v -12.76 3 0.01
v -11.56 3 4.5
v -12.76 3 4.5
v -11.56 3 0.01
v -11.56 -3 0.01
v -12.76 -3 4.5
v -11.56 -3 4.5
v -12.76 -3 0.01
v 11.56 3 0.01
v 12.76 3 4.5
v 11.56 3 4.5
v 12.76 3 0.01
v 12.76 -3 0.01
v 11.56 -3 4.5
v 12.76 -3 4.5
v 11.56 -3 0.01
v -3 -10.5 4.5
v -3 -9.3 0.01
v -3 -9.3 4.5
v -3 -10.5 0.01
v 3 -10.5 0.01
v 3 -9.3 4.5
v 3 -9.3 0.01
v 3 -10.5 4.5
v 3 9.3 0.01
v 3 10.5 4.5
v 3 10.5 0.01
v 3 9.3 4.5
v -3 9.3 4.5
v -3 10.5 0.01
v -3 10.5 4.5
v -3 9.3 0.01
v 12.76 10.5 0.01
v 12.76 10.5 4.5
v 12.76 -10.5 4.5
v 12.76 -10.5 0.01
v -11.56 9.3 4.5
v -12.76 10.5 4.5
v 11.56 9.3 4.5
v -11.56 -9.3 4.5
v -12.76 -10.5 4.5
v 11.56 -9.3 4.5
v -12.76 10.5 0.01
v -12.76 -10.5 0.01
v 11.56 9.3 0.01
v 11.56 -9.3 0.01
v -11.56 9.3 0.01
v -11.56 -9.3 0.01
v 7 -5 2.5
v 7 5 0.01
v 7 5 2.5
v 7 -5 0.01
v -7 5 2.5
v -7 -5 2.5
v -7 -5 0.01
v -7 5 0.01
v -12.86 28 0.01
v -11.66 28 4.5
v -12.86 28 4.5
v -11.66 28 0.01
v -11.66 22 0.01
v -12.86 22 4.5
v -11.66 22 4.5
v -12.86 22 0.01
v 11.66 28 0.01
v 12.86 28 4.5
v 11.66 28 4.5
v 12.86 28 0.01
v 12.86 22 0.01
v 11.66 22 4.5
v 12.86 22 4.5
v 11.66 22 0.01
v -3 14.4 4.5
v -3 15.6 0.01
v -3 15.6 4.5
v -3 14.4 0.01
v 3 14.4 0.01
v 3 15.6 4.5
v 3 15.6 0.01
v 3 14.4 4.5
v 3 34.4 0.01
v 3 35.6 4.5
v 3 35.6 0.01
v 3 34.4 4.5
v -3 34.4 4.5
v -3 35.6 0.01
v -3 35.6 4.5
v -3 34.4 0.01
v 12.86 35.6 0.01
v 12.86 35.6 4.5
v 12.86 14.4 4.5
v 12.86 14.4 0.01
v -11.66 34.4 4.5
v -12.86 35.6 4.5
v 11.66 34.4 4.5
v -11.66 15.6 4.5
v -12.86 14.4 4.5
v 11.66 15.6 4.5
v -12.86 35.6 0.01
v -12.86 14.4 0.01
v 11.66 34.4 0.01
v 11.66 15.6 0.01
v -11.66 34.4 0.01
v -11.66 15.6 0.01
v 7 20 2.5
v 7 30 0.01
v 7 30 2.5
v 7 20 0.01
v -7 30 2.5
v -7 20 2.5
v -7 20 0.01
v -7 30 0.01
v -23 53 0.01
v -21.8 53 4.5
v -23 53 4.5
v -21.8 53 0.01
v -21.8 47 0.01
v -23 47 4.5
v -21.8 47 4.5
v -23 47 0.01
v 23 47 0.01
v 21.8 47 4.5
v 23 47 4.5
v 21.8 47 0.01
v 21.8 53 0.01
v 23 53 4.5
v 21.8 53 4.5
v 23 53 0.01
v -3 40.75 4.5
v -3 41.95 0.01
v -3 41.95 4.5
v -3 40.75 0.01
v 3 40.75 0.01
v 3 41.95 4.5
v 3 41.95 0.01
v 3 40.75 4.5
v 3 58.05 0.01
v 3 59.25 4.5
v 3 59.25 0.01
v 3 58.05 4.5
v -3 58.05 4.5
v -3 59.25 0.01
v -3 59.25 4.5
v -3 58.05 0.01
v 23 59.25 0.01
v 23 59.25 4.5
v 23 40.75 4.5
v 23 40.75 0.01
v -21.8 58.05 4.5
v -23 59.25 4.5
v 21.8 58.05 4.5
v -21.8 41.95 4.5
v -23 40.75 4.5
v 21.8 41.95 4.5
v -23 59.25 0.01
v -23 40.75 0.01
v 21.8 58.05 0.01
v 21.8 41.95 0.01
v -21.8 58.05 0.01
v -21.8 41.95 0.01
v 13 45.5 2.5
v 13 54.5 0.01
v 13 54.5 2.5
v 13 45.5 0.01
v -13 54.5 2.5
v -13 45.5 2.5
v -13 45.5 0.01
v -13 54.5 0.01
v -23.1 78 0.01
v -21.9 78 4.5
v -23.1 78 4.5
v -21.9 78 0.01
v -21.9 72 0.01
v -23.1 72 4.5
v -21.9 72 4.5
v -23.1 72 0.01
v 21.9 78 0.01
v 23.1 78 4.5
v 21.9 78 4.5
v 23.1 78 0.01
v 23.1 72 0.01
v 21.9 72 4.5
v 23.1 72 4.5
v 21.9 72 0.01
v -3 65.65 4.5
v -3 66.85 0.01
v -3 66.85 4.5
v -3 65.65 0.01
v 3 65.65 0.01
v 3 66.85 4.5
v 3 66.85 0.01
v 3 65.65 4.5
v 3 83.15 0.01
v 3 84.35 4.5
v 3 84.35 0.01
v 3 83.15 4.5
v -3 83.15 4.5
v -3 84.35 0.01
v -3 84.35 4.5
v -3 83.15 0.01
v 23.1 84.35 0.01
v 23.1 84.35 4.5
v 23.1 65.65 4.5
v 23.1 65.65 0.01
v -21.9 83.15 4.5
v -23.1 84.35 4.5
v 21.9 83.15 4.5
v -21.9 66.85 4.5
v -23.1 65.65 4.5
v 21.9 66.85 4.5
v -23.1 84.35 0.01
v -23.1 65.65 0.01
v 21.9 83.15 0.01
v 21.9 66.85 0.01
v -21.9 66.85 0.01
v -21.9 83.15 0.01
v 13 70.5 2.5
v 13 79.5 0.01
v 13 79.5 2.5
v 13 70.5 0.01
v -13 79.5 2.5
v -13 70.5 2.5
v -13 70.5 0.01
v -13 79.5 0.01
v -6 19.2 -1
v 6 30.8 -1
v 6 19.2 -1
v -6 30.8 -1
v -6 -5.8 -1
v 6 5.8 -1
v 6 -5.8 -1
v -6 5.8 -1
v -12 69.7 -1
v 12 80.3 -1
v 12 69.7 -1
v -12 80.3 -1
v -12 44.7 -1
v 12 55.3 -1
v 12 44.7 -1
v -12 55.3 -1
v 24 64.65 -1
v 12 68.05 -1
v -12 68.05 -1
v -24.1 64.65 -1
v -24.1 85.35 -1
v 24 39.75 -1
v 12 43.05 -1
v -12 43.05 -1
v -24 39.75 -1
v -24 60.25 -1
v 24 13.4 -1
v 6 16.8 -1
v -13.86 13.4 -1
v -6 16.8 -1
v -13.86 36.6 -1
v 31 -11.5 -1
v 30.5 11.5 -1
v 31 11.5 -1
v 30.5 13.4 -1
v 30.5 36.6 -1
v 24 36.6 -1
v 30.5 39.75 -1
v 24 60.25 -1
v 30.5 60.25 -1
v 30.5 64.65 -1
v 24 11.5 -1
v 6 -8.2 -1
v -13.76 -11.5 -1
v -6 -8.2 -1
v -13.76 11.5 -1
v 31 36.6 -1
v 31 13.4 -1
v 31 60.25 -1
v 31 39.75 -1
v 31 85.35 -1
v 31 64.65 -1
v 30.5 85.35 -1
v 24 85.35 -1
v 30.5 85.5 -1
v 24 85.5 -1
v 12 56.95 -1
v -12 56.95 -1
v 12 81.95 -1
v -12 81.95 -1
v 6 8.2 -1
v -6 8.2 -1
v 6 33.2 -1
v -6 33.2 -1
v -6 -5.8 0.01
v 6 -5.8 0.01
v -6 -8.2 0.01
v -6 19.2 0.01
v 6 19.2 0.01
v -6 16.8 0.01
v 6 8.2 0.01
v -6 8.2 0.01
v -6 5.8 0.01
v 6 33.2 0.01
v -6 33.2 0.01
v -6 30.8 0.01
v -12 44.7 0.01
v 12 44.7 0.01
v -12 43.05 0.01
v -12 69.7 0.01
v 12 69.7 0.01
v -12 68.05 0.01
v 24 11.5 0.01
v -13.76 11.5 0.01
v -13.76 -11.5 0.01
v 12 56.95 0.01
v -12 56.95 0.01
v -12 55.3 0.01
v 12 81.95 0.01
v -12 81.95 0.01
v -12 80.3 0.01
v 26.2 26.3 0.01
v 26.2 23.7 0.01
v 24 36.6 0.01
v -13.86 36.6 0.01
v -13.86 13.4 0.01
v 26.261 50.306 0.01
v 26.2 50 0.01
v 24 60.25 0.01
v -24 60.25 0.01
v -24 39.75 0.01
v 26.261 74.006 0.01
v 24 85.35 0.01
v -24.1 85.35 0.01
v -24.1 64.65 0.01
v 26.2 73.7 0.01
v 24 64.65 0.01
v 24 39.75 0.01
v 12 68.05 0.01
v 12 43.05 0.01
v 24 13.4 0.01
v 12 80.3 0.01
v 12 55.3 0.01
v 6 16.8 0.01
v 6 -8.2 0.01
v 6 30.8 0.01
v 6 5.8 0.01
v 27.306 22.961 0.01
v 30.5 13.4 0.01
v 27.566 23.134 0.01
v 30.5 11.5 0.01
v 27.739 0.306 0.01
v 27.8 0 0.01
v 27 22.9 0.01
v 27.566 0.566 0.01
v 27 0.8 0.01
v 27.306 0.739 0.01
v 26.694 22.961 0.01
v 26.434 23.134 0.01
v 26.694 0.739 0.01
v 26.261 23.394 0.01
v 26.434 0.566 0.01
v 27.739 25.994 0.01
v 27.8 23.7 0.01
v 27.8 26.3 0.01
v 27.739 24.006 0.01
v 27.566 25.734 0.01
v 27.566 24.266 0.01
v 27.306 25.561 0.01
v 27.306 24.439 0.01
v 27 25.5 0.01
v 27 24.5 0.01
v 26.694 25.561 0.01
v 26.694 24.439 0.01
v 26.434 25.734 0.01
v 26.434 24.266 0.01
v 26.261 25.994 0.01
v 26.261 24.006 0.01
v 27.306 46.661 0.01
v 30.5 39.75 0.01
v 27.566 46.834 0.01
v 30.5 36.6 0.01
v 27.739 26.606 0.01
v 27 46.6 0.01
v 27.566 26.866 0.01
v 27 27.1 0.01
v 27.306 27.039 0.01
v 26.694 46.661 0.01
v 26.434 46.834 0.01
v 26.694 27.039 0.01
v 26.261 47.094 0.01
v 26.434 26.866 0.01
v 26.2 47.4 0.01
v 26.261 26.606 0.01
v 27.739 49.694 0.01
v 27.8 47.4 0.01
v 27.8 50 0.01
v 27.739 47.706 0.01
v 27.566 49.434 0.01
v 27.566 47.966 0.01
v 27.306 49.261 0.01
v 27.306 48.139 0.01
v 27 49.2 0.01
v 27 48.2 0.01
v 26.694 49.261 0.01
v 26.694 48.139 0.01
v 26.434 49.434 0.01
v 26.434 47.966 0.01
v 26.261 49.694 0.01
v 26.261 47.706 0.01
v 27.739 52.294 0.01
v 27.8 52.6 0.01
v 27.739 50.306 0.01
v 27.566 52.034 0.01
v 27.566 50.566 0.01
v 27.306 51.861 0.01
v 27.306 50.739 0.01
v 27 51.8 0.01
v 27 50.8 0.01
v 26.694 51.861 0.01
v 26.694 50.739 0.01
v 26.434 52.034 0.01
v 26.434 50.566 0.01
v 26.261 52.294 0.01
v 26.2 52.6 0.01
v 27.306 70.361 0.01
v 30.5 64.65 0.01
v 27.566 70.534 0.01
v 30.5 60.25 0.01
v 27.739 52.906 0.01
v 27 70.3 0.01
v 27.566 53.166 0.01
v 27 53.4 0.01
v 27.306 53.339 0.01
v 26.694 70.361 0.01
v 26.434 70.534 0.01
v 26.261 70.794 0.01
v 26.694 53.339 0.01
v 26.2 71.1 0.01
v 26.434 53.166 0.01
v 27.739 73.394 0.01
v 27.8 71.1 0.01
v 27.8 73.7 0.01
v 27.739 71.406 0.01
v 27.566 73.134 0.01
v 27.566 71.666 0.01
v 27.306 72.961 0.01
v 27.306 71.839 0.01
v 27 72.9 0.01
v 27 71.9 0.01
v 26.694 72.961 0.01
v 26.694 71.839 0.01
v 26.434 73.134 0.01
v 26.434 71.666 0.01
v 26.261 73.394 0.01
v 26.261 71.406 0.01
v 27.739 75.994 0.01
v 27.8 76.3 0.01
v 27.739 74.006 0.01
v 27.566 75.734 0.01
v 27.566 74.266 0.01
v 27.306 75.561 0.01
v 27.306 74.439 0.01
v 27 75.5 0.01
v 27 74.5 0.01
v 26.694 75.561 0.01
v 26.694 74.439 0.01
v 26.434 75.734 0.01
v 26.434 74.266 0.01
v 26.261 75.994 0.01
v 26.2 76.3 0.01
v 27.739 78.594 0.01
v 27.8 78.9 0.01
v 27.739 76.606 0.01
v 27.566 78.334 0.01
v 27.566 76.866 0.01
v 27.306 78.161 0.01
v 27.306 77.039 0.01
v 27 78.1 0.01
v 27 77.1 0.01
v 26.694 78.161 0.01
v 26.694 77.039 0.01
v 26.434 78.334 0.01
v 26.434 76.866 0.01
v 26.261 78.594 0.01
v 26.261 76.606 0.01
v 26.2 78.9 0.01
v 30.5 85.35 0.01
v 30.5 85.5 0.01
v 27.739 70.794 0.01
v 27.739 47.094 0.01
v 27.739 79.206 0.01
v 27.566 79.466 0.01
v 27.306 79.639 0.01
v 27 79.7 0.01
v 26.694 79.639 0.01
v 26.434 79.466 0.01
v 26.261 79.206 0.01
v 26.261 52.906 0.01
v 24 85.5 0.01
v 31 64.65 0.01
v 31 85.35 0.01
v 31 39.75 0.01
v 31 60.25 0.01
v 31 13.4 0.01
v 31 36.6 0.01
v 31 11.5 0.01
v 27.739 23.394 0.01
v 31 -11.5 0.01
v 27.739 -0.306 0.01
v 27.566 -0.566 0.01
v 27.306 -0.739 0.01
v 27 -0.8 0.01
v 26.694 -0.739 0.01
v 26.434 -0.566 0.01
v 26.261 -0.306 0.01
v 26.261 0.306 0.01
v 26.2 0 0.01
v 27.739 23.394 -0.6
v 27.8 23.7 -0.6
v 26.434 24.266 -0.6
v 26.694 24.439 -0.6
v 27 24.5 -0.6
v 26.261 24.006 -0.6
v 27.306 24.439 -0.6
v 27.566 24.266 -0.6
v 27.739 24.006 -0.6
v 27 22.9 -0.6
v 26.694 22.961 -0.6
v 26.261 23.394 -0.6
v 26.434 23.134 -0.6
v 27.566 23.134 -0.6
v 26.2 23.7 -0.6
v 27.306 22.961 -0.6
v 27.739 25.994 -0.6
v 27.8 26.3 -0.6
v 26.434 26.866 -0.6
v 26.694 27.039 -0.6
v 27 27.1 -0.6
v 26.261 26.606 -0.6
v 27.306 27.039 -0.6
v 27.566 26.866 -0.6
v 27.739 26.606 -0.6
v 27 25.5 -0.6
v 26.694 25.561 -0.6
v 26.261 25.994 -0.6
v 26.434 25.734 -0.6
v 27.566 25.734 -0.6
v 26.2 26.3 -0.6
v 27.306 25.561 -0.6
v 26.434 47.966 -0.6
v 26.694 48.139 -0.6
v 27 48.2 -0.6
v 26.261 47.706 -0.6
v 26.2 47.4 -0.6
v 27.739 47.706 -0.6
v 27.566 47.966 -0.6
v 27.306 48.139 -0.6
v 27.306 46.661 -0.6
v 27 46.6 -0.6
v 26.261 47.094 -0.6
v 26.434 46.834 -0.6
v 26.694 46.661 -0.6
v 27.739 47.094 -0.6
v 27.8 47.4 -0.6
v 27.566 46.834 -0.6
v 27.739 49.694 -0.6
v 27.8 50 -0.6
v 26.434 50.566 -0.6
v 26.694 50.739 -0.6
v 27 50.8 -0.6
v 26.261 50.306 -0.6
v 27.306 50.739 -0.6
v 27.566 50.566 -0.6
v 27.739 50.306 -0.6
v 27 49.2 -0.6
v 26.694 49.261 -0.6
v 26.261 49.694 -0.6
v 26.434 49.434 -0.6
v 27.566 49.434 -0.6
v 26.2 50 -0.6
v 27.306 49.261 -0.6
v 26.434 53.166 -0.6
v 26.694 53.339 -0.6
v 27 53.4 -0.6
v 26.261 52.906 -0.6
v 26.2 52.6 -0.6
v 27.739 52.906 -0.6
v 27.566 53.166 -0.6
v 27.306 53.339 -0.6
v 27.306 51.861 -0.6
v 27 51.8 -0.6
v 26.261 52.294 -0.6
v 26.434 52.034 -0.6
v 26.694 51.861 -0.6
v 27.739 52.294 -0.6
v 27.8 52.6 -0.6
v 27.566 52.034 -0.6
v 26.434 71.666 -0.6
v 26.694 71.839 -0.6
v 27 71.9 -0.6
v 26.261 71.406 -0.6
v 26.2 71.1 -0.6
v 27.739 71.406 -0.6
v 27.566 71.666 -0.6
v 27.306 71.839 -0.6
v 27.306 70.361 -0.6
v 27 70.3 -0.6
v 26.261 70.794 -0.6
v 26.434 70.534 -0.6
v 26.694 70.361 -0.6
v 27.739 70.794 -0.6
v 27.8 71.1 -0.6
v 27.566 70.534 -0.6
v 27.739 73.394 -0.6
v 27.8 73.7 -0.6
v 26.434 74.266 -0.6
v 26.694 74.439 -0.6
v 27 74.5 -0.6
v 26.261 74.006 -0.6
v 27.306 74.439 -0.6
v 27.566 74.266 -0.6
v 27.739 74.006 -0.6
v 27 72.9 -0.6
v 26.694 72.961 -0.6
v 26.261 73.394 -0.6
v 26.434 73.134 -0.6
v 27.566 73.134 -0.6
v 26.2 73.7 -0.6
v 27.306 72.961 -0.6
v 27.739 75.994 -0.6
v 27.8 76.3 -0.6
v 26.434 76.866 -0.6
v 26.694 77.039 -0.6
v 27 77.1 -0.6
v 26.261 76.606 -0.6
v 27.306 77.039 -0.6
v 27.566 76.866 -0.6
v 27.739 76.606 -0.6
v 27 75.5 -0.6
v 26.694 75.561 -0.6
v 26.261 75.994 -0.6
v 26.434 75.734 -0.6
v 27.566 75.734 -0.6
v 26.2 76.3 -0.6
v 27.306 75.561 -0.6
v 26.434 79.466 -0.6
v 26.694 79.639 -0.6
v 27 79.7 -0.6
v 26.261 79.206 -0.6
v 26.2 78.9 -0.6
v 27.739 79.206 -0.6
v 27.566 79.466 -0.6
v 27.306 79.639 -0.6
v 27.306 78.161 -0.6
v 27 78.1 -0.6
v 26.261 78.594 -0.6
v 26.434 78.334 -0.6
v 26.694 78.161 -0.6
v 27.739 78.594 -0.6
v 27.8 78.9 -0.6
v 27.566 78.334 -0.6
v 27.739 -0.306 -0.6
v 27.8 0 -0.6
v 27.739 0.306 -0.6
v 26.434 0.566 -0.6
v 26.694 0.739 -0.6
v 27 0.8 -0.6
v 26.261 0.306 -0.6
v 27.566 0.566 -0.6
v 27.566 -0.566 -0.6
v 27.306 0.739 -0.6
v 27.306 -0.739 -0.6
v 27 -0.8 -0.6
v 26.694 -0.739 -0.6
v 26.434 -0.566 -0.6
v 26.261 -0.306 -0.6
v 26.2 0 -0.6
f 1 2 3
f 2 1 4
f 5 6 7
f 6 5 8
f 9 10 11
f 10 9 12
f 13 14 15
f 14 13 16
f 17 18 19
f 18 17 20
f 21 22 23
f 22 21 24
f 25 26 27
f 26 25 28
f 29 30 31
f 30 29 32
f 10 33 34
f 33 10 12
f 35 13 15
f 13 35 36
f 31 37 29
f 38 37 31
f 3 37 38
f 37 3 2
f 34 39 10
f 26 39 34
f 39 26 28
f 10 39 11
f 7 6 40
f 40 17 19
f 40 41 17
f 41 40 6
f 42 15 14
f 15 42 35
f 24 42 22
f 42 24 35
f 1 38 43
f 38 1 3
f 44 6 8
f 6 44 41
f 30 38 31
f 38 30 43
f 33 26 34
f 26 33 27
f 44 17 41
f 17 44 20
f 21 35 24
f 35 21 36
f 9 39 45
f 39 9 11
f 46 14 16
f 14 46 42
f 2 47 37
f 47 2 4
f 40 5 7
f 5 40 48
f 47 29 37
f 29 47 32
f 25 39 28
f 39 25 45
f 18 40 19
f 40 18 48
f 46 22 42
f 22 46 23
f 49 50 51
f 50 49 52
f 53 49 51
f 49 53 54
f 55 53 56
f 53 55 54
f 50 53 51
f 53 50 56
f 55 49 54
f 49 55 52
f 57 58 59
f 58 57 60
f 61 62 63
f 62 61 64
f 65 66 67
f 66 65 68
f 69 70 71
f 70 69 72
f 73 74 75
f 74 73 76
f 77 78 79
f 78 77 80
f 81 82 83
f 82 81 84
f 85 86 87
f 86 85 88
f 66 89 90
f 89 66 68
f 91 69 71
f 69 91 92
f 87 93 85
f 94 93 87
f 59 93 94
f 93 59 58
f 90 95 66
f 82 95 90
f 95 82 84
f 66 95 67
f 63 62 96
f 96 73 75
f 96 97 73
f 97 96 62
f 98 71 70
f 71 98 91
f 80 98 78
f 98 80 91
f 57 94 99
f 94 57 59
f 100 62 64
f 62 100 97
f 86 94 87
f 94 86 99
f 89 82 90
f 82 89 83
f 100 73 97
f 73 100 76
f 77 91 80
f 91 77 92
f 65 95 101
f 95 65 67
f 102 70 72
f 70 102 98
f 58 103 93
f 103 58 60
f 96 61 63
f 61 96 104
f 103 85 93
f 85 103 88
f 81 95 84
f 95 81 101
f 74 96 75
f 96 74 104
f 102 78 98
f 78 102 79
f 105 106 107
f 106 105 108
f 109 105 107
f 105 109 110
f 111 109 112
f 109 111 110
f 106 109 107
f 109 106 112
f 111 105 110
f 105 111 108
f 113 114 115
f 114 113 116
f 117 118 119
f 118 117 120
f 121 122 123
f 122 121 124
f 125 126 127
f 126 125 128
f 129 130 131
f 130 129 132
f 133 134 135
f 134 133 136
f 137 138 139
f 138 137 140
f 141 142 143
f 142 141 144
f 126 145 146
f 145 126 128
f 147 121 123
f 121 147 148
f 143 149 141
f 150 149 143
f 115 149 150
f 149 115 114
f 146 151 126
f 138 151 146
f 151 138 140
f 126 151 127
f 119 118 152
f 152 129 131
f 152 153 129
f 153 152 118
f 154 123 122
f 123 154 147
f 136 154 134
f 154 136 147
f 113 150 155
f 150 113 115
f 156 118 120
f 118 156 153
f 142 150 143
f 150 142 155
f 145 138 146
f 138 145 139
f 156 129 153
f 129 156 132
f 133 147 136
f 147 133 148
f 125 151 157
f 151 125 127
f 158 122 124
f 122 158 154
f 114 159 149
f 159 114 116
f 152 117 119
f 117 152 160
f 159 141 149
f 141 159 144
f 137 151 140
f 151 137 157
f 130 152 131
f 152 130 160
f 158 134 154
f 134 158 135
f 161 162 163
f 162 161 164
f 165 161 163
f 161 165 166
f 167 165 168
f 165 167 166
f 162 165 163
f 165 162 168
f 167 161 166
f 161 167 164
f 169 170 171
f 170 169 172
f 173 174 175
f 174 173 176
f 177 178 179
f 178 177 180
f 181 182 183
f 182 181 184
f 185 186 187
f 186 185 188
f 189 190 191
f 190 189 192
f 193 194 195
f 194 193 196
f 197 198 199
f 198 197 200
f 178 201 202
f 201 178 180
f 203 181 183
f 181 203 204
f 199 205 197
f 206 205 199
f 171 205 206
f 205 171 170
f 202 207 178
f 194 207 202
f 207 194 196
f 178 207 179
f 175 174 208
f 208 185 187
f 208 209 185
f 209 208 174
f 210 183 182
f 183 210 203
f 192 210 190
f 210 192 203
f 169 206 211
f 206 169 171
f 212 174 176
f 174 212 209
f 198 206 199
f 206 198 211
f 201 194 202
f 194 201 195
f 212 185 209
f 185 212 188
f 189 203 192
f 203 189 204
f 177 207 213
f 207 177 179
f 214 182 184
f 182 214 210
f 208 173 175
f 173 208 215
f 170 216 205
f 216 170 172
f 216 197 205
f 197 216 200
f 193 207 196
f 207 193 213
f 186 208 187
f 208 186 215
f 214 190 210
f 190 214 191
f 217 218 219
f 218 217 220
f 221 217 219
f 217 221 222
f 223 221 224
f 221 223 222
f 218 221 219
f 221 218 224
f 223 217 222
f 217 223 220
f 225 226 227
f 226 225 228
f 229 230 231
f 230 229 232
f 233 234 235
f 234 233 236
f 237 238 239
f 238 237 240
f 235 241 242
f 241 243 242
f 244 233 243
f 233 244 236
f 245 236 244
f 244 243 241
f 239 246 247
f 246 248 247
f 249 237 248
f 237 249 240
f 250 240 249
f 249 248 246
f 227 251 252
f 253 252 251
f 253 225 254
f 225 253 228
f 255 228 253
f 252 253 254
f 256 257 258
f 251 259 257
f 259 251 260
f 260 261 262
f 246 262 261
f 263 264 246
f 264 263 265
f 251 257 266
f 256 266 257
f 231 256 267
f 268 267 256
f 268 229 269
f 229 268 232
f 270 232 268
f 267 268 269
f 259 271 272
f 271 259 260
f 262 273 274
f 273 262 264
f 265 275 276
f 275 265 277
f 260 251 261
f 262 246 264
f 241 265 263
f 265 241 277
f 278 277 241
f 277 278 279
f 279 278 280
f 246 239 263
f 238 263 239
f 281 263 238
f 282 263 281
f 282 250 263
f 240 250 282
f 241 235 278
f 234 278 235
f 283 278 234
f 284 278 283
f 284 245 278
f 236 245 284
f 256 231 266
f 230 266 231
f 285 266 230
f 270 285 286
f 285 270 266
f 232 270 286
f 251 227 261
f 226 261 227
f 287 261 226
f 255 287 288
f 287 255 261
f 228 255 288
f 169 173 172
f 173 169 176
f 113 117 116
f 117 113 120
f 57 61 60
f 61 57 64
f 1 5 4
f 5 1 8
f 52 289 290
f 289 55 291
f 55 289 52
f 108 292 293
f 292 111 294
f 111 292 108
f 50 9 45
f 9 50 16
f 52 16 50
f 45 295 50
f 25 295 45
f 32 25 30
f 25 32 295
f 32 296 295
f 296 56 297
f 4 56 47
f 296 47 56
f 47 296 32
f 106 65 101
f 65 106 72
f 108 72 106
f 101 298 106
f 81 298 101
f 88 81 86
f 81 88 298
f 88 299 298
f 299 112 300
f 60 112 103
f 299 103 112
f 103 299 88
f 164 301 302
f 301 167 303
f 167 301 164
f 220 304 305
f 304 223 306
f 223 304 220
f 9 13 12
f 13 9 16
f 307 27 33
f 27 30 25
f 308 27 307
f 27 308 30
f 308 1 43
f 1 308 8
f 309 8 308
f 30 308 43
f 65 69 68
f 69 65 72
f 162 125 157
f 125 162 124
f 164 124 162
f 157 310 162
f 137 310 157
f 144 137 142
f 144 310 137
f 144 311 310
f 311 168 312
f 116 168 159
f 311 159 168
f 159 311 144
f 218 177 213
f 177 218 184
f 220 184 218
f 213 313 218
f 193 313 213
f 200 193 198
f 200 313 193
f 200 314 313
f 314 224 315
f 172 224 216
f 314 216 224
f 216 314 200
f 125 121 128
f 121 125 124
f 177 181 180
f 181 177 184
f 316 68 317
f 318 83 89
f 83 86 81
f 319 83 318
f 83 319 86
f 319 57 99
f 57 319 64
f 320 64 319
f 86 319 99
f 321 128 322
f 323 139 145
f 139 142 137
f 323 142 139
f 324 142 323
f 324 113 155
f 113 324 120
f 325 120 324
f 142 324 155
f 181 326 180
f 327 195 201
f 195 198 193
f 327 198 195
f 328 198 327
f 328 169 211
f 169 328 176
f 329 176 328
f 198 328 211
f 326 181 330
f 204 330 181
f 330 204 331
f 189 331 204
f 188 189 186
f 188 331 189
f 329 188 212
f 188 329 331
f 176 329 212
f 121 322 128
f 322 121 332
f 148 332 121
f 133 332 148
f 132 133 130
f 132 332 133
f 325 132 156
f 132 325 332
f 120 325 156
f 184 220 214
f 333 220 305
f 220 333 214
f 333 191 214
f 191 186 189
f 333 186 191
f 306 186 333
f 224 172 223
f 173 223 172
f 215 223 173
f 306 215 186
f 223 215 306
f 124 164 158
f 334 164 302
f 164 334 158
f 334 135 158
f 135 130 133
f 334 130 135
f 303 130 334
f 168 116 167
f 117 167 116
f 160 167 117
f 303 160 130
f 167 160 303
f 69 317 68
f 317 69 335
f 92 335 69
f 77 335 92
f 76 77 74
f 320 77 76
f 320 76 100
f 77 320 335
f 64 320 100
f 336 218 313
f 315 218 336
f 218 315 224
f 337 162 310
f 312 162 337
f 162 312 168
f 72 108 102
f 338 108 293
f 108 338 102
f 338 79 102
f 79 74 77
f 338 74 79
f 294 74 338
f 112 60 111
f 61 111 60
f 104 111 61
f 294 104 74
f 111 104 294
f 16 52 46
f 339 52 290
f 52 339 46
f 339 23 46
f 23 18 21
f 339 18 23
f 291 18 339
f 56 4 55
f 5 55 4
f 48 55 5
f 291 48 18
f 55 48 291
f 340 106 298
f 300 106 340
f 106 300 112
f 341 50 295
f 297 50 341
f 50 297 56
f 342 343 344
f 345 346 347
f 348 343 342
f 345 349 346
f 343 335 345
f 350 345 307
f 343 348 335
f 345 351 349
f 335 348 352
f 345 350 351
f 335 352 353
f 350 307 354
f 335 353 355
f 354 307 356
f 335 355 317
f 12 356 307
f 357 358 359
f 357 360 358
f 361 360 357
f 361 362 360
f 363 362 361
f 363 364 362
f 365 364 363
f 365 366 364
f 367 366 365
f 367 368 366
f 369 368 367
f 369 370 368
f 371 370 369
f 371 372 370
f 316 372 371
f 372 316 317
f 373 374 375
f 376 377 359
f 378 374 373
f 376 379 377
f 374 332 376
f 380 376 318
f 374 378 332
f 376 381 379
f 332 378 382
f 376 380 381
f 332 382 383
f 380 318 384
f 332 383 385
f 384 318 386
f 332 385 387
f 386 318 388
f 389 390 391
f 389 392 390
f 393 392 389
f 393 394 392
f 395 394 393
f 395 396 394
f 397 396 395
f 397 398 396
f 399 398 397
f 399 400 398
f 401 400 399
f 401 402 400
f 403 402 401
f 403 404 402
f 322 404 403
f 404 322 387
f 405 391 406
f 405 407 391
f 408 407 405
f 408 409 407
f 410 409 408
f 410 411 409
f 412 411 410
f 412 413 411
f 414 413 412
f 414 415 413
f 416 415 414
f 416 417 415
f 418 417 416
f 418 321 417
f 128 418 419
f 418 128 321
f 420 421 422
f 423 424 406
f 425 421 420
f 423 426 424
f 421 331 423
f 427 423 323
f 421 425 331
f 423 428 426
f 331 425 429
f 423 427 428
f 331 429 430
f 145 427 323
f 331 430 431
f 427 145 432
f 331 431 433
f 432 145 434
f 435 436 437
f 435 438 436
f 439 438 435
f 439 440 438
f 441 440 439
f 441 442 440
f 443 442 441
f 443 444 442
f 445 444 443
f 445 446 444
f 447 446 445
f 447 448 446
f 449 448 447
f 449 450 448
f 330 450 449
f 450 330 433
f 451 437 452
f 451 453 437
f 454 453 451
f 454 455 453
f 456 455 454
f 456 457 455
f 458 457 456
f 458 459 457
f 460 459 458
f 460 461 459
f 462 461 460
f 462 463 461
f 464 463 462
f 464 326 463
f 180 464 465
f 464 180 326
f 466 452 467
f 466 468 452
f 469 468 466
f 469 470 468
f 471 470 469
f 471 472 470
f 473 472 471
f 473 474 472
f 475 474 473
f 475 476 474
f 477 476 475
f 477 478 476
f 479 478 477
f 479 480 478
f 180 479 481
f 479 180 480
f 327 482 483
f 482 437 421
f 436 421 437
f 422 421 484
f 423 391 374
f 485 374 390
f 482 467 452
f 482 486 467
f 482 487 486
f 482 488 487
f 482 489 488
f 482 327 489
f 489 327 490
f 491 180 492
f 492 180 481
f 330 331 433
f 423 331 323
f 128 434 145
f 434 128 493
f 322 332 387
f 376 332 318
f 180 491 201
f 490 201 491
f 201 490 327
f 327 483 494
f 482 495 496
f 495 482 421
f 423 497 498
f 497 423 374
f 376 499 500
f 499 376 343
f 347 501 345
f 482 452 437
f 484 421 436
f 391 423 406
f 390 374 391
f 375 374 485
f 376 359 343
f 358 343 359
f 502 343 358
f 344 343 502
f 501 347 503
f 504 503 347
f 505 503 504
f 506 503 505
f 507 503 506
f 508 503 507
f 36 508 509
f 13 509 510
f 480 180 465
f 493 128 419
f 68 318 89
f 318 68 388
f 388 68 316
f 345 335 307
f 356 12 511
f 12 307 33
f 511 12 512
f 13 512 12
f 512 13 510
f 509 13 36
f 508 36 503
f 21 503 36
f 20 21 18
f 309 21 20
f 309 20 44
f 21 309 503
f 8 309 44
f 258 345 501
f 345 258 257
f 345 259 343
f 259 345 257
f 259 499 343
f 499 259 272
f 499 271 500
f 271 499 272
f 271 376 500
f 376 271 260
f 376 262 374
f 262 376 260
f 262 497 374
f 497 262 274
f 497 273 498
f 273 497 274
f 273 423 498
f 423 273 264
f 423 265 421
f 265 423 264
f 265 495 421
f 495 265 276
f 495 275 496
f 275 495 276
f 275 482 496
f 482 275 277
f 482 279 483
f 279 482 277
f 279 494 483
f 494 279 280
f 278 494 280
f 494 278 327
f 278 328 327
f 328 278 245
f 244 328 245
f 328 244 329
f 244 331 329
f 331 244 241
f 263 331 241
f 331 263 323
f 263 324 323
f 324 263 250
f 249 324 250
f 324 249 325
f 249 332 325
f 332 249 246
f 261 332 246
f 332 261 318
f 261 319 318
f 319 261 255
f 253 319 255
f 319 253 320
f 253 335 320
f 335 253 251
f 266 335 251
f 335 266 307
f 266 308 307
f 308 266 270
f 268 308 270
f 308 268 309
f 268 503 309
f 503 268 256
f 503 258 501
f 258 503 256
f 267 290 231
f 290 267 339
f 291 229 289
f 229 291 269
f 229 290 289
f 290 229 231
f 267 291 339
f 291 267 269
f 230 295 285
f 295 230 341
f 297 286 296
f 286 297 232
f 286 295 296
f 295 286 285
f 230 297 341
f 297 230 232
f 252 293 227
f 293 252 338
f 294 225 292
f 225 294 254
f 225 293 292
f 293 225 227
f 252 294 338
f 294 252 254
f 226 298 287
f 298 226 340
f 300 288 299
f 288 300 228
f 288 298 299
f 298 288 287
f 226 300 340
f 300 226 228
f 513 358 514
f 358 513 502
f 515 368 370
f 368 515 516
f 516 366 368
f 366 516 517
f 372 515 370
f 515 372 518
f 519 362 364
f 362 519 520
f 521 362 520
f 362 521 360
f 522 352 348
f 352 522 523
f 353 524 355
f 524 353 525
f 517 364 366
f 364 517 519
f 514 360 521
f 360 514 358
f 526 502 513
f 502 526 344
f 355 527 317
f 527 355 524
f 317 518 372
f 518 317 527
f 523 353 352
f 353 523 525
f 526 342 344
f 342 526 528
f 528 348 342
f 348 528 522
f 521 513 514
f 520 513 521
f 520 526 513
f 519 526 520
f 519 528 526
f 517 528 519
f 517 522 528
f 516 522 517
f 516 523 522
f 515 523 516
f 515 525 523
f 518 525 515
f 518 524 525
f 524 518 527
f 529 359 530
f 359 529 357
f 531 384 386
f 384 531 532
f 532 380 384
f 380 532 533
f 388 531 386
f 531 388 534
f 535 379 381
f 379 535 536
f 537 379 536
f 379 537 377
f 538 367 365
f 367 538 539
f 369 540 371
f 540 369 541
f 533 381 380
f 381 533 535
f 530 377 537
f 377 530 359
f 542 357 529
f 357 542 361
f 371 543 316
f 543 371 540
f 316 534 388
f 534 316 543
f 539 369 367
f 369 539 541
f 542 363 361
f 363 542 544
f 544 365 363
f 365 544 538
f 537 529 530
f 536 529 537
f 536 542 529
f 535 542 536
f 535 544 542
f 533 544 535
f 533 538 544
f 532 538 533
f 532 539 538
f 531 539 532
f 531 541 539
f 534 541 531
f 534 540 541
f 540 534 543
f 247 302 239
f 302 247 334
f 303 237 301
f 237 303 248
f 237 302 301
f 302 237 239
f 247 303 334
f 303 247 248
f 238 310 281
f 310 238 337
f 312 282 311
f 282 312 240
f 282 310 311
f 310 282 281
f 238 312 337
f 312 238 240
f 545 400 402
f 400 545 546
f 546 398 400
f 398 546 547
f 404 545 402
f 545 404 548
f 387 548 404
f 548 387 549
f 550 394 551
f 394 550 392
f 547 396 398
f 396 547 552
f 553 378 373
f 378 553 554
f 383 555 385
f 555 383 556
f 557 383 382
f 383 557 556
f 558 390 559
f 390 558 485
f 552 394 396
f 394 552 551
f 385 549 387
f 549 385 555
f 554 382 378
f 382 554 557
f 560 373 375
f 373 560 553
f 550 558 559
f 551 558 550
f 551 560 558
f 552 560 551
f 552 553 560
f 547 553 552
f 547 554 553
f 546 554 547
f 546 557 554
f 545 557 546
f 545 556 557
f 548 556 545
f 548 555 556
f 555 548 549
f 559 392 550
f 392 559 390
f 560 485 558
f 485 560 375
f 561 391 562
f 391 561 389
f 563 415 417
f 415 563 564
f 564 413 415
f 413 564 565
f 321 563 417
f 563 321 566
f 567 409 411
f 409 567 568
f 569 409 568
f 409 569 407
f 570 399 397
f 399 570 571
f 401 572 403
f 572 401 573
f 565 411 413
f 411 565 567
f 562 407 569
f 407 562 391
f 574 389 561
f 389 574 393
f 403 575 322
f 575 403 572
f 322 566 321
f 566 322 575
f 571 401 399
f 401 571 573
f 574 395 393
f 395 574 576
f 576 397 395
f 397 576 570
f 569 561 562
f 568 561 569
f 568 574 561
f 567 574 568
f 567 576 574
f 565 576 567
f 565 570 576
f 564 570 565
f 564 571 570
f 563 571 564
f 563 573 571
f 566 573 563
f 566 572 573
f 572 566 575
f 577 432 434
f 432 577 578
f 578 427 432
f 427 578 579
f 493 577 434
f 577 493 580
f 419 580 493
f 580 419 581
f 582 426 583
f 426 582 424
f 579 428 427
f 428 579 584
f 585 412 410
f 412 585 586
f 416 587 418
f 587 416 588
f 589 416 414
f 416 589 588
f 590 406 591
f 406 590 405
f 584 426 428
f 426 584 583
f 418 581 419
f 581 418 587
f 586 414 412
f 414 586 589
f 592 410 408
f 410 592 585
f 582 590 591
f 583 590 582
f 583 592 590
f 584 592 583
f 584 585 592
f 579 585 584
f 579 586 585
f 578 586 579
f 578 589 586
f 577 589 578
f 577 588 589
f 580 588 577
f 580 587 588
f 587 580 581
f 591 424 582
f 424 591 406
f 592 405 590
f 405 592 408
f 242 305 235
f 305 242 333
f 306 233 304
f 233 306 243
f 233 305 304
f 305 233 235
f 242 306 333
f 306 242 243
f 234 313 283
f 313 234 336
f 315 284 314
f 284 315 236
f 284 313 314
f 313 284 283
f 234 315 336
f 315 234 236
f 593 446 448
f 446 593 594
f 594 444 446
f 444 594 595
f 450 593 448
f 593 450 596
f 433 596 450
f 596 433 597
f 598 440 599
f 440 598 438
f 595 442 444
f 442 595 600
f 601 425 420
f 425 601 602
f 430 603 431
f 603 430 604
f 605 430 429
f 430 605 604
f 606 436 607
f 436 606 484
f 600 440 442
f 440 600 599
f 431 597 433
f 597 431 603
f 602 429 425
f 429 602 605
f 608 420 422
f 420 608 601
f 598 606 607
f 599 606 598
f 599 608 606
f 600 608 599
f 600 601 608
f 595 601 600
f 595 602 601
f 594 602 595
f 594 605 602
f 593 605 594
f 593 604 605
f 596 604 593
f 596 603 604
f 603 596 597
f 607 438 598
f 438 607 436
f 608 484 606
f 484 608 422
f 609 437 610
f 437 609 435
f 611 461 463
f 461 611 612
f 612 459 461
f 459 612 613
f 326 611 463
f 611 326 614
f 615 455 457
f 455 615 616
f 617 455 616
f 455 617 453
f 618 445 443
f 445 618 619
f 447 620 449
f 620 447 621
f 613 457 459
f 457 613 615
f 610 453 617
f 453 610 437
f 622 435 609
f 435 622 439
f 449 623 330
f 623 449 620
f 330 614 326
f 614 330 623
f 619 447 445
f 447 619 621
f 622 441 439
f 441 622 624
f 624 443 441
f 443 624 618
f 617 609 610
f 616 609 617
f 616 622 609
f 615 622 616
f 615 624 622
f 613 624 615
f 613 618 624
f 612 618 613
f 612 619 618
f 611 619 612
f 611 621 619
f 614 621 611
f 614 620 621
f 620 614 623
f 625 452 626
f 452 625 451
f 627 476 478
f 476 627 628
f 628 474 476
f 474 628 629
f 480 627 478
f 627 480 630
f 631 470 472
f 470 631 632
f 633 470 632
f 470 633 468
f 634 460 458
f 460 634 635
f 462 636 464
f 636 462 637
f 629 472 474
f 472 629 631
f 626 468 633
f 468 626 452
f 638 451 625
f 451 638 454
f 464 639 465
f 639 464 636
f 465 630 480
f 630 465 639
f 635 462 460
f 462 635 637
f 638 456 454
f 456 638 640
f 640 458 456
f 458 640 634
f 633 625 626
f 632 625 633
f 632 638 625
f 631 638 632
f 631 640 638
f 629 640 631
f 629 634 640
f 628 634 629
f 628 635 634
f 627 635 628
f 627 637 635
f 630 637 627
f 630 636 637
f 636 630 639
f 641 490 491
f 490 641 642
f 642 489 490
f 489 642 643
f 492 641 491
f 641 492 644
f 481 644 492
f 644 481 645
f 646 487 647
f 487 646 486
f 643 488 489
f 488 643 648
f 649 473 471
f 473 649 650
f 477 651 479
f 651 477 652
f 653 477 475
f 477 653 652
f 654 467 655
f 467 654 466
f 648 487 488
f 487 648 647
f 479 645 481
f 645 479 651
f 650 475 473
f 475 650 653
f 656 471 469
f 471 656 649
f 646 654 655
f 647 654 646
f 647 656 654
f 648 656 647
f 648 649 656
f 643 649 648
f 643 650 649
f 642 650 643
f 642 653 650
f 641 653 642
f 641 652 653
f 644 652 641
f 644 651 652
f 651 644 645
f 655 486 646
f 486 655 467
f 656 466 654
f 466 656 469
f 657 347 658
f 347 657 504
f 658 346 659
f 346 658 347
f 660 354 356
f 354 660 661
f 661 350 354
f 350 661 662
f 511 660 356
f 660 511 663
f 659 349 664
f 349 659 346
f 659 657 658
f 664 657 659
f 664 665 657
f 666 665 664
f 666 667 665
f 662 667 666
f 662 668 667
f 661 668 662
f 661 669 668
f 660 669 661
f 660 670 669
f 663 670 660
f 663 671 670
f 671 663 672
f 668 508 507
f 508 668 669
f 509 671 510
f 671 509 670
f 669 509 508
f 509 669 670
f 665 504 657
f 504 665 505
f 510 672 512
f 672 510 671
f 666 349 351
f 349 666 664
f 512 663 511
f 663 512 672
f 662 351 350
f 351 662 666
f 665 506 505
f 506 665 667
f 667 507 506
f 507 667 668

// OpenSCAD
// file: ../../util/marks.scad
//-----------------------------------------------------------------------
// Marks for fit pieces: n dots in a row, engraved into a face, so each
// variant can be told apart after printing. Origin: centre of the row, on
// the face; the dots cut down into -Z. Units: mm.
//-----------------------------------------------------------------------

markDotDia   = 1.6;
markDotPitch = 2.6;
markDotDepth = 0.6;

module markDots(n)
{
  for (i = [0 : n - 1])
    translate([(i - (n - 1)/2)*markDotPitch, 0, -markDotDepth])
      cylinder(d = markDotDia, h = markDotDepth + 1, $fn = 16);
}
// file: board-pocket.scad
//-----------------------------------------------------------------------
// Board pocket: holds a board that has no mounting holes
//
// The board sits on a central pedestal with a pad of double-sided foam tape
// on top, inside a low wall that follows its outline. The pedestal keeps
// the board's edges off the floor, so lead stubs soldered through the edge
// holes have room underneath; gaps in the wall let the leads out. The wall
// only locates the board: the tape holds it down, and in a closed box a lid
// pad presses a pad of foam onto it (boardLidPad below).
//
// Modules, all in the same frame:
//   boardPocketGhost()   the board and its tape, for previews
//   boardPocketHolder()  the plastic: pedestal and outline wall, add to the floor
//   boardLidPad()        a block hanging from the lid that presses foam onto the board
//   boardLidPadGhost()   the foam under it, squashed, for previews
//
// Frame: origin on the floor top, under the centre of the board's outline.
// X along the board's length l, Y across its width w, Z up. Units: mm.
//
// Sides are listed [-X, +X, -Y, +Y], each one of
//   "gap"    wall with a gap in the middle for leads (gapW wide)
//   "solid"  whole wall: use it where the board takes a push (a plug)
//   "open"   no wall: the board's edge goes into a box wall (a USB port)
//
// Used by esp32-c3-supermini, esp32-s3-devkitc and rs485-max485.
//-----------------------------------------------------------------------

//-- From the controller project's receiver.scad / rack-end.scad (boardPocket), 2026-10-30
bpPedestal  = 2.5;     // floor to the tape: room for lead stubs under the board edges
bpTape      = 1.0;     // double-sided foam tape on the pedestal. CAL: how far it squashes
bpWall      = 1.2;     // outline wall thickness
bpRise      = 1.0;     // wall top above the PCB underside (the controller project's rack-end: 0.8 under the S3's module)
bpClearance = 0.4;     // per side, board outline to wall: PETG. 0.3 for PLA. Set by the fit piece
bpGapW      = 6;       // lead gap in a "gap" side
bpPadInset  = 4;       // default pedestal: the board less this all round

//-- Lid hold-down (the controller project's receiver / rack-end lid pads)
bpFoam      = 3.0;     // CAL: self-adhesive foam stuck under each lid pad
bpSqueeze   = 1.0;     // how far the lid squashes it: ~1/3 for soft foam, 0.3 for felt

//-- PCB underside above the floor top
function boardPocketZ(pedestal = bpPedestal, tape = bpTape) = pedestal + tape;
//-- default pedestal [l, w] for a board
function boardPocketPad(l, w, inset = bpPadInset) = [max(l - 2*inset, 4), max(w - 2*inset, 4)];
//-- Z of a lid pad's underside, pressing on a surface at surfaceZ (board top, or a part on it)
function boardLidPadZ(surfaceZ, foam = bpFoam, squeeze = bpSqueeze) =
  assert(squeeze > 0 && squeeze < foam, "foam would not touch the board")
  surfaceZ + foam - squeeze;

function bpSides4(s) = is_list(s) ? s : [s, s, s, s];

module boardPocketGhost(l, w, pcb = 1.6, pad, pedestal = bpPedestal, tape = bpTape)
{
  p = is_undef(pad) ? boardPocketPad(l, w) : pad;
  %color("White") translate([-p[0]/2, -p[1]/2, pedestal]) cube([p[0], p[1], tape]);
  %color("DarkGreen") translate([-l/2, -w/2, pedestal + tape]) cube([l, w, pcb]);
}

//-- pad: pedestal [l, w]; gapW a number or one per side
module boardPocketHolder(l, w, pad, sides = "gap", gapW = bpGapW, clearance = bpClearance,
                         pedestal = bpPedestal, tape = bpTape, wall = bpWall, rise = bpRise)
{
  p   = is_undef(pad) ? boardPocketPad(l, w) : pad;
  s   = bpSides4(sides);
  g   = bpSides4(gapW);
  ix  = l/2 + clearance;                 // inner half sizes
  iy  = w/2 + clearance;
  top = pedestal + tape + rise;
  assert(p[0] <= l && p[1] <= w, "pedestal bigger than the board");
  for (k = s) assert(k == "gap" || k == "solid" || k == "open", str("unknown side ", k));

  //-- pedestal, centred under the board
  translate([-p[0]/2, -p[1]/2, -0.01]) cube([p[0], p[1], pedestal + 0.01]);
  //-- outline wall
  difference()
  {
    translate([-ix - wall, -iy - wall, -0.01]) cube([2*(ix + wall), 2*(iy + wall), top + 0.01]);
    translate([-ix, -iy, -1]) cube([2*ix, 2*iy, top + 2]);
    for (i = [0 : 3])
    {
      //-- each side's cut, drawn for -X then turned into place
      ax = (i < 2) ? ix : iy;         // inner half size across the side
      al = (i < 2) ? iy : ix;         // half length along it
      rotate([0, 0, [0, 180, 90, 270][i]])   // -X, +X, -Y, +Y
      {
        if (s[i] == "gap")
          translate([-ax - wall - 1, -g[i]/2, -1]) cube([wall + 2, g[i], top + 2]);
        if (s[i] == "open")
          translate([-ax - wall - 1, -al - wall - 1, -1]) cube([wall + 1.01, 2*(al + wall + 1), top + 2]);
      }
    }
  }
}

//-- A lid pad over the rectangle size [x, y] centred at `at`, from the squashed foam up to
//-- lidZ (the lid's inner face in this frame), running `into` up into the lid plate
module boardLidPad(size, at = [0, 0], surfaceZ, lidZ, foam = bpFoam, squeeze = bpSqueeze, into = 0.5)
{
  z0 = boardLidPadZ(surfaceZ, foam, squeeze);
  assert(lidZ > z0, "lid is below the pad: the box is too low for the foam");
  translate([at[0] - size[0]/2, at[1] - size[1]/2, z0]) cube([size[0], size[1], lidZ - z0 + into]);
}

module boardLidPadGhost(size, at = [0, 0], surfaceZ, foam = bpFoam, squeeze = bpSqueeze)
{
  %color("Gray") translate([at[0] - size[0]/2, at[1] - size[1]/2, surfaceZ]) cube([size[0], size[1], foam - squeeze]);
}
// main file
//-----------------------------------------------------------------------
// Fit piece: four board pockets on a light frame, marked 1 to 4 dots at
// their right-hand end. Two for the ESP32-C3 Super Mini, two for the JZK
// RS485 module, each at the PETG and the PLA clearance.
//
//   1  C3 Super Mini 22.52 x 18,  clearance 0.3 (PLA)
//   2  C3 Super Mini 22.52 x 18,  clearance 0.4 (PETG)
//   3  RS485 module  43 x 15.5,   clearance 0.3 (PLA)
//   4  RS485 module  43 x 15.5,   clearance 0.4 (PETG)
//
// Drop each board in: it should go in without forcing and not rattle about
// more than you'd like. Then stick a pad of the foam tape on the pedestal
// and press the board down: the edges should stay clear of the floor.
// The floor is a frame (windows either side of each pedestal) to save plastic.
// Prints base down, as exported, no supports. Units: mm.
//-----------------------------------------------------------------------

use <board-pocket.scad>
use <../../util/marks.scad>

baseThick = 1.0;
pitch     = 25;
dotX      = 27;       // dots, past the longest pocket
tabX      = 31;       // frame's +X end

//-- [l, w, pedestal [l, w], clearance]: pedestals as in the controller project's receiver.scad
stations = [
  [22.52, 18.0, [14, 10], 0.3],
  [22.52, 18.0, [14, 10], 0.4],
  [43.0,  15.5, [26,  9], 0.3],
  [43.0,  15.5, [26,  9], 0.4],
];
wallT = 1.2;
n = len(stations);

module footprint(s) let (ox = s[0]/2 + s[3] + wallT + 1, oy = s[1]/2 + s[3] + wallT + 1)
  translate([-ox, -oy]) square([ox + tabX, 2*oy]);

difference()
{
  union()
  {
    //-- frame: each pocket's footprint plus a spine joining them under the dots
    translate([0, 0, -baseThick])
      linear_extrude(baseThick + 0.01)
      {
        for (i = [0 : n - 1]) translate([0, i*pitch]) footprint(stations[i]);
        translate([dotX - 3, -pitch/2 + 2]) square([tabX - dotX + 2.5, (n - 1)*pitch + pitch - 4]);
      }
    for (i = [0 : n - 1])
      translate([0, i*pitch, 0])
        boardPocketHolder(stations[i][0], stations[i][1], stations[i][2], clearance = stations[i][3]);
  }
  for (i = [0 : n - 1])
  {
    s = stations[i];
    //-- windows in the floor either side of the pedestal
    for (m = [-1, 1])
      translate([-s[2][0]/2 + 1, i*pitch + m*(s[2][1]/2 + 0.8) - (m < 0 ? s[1]/2 - s[2][1]/2 - 1.6 : 0), -baseThick - 1])
        cube([s[2][0] - 2, s[1]/2 - s[2][1]/2 - 1.6, baseThick + 1.02]);
    translate([dotX, i*pitch, 0]) rotate([0, 0, 90]) markDots(i + 1);
  }
}

if ($preview)
  for (i = [0 : n - 1])
    translate([0, i*pitch, 0]) boardPocketGhost(stations[i][0], stations[i][1], 1.6, stations[i][2]);
